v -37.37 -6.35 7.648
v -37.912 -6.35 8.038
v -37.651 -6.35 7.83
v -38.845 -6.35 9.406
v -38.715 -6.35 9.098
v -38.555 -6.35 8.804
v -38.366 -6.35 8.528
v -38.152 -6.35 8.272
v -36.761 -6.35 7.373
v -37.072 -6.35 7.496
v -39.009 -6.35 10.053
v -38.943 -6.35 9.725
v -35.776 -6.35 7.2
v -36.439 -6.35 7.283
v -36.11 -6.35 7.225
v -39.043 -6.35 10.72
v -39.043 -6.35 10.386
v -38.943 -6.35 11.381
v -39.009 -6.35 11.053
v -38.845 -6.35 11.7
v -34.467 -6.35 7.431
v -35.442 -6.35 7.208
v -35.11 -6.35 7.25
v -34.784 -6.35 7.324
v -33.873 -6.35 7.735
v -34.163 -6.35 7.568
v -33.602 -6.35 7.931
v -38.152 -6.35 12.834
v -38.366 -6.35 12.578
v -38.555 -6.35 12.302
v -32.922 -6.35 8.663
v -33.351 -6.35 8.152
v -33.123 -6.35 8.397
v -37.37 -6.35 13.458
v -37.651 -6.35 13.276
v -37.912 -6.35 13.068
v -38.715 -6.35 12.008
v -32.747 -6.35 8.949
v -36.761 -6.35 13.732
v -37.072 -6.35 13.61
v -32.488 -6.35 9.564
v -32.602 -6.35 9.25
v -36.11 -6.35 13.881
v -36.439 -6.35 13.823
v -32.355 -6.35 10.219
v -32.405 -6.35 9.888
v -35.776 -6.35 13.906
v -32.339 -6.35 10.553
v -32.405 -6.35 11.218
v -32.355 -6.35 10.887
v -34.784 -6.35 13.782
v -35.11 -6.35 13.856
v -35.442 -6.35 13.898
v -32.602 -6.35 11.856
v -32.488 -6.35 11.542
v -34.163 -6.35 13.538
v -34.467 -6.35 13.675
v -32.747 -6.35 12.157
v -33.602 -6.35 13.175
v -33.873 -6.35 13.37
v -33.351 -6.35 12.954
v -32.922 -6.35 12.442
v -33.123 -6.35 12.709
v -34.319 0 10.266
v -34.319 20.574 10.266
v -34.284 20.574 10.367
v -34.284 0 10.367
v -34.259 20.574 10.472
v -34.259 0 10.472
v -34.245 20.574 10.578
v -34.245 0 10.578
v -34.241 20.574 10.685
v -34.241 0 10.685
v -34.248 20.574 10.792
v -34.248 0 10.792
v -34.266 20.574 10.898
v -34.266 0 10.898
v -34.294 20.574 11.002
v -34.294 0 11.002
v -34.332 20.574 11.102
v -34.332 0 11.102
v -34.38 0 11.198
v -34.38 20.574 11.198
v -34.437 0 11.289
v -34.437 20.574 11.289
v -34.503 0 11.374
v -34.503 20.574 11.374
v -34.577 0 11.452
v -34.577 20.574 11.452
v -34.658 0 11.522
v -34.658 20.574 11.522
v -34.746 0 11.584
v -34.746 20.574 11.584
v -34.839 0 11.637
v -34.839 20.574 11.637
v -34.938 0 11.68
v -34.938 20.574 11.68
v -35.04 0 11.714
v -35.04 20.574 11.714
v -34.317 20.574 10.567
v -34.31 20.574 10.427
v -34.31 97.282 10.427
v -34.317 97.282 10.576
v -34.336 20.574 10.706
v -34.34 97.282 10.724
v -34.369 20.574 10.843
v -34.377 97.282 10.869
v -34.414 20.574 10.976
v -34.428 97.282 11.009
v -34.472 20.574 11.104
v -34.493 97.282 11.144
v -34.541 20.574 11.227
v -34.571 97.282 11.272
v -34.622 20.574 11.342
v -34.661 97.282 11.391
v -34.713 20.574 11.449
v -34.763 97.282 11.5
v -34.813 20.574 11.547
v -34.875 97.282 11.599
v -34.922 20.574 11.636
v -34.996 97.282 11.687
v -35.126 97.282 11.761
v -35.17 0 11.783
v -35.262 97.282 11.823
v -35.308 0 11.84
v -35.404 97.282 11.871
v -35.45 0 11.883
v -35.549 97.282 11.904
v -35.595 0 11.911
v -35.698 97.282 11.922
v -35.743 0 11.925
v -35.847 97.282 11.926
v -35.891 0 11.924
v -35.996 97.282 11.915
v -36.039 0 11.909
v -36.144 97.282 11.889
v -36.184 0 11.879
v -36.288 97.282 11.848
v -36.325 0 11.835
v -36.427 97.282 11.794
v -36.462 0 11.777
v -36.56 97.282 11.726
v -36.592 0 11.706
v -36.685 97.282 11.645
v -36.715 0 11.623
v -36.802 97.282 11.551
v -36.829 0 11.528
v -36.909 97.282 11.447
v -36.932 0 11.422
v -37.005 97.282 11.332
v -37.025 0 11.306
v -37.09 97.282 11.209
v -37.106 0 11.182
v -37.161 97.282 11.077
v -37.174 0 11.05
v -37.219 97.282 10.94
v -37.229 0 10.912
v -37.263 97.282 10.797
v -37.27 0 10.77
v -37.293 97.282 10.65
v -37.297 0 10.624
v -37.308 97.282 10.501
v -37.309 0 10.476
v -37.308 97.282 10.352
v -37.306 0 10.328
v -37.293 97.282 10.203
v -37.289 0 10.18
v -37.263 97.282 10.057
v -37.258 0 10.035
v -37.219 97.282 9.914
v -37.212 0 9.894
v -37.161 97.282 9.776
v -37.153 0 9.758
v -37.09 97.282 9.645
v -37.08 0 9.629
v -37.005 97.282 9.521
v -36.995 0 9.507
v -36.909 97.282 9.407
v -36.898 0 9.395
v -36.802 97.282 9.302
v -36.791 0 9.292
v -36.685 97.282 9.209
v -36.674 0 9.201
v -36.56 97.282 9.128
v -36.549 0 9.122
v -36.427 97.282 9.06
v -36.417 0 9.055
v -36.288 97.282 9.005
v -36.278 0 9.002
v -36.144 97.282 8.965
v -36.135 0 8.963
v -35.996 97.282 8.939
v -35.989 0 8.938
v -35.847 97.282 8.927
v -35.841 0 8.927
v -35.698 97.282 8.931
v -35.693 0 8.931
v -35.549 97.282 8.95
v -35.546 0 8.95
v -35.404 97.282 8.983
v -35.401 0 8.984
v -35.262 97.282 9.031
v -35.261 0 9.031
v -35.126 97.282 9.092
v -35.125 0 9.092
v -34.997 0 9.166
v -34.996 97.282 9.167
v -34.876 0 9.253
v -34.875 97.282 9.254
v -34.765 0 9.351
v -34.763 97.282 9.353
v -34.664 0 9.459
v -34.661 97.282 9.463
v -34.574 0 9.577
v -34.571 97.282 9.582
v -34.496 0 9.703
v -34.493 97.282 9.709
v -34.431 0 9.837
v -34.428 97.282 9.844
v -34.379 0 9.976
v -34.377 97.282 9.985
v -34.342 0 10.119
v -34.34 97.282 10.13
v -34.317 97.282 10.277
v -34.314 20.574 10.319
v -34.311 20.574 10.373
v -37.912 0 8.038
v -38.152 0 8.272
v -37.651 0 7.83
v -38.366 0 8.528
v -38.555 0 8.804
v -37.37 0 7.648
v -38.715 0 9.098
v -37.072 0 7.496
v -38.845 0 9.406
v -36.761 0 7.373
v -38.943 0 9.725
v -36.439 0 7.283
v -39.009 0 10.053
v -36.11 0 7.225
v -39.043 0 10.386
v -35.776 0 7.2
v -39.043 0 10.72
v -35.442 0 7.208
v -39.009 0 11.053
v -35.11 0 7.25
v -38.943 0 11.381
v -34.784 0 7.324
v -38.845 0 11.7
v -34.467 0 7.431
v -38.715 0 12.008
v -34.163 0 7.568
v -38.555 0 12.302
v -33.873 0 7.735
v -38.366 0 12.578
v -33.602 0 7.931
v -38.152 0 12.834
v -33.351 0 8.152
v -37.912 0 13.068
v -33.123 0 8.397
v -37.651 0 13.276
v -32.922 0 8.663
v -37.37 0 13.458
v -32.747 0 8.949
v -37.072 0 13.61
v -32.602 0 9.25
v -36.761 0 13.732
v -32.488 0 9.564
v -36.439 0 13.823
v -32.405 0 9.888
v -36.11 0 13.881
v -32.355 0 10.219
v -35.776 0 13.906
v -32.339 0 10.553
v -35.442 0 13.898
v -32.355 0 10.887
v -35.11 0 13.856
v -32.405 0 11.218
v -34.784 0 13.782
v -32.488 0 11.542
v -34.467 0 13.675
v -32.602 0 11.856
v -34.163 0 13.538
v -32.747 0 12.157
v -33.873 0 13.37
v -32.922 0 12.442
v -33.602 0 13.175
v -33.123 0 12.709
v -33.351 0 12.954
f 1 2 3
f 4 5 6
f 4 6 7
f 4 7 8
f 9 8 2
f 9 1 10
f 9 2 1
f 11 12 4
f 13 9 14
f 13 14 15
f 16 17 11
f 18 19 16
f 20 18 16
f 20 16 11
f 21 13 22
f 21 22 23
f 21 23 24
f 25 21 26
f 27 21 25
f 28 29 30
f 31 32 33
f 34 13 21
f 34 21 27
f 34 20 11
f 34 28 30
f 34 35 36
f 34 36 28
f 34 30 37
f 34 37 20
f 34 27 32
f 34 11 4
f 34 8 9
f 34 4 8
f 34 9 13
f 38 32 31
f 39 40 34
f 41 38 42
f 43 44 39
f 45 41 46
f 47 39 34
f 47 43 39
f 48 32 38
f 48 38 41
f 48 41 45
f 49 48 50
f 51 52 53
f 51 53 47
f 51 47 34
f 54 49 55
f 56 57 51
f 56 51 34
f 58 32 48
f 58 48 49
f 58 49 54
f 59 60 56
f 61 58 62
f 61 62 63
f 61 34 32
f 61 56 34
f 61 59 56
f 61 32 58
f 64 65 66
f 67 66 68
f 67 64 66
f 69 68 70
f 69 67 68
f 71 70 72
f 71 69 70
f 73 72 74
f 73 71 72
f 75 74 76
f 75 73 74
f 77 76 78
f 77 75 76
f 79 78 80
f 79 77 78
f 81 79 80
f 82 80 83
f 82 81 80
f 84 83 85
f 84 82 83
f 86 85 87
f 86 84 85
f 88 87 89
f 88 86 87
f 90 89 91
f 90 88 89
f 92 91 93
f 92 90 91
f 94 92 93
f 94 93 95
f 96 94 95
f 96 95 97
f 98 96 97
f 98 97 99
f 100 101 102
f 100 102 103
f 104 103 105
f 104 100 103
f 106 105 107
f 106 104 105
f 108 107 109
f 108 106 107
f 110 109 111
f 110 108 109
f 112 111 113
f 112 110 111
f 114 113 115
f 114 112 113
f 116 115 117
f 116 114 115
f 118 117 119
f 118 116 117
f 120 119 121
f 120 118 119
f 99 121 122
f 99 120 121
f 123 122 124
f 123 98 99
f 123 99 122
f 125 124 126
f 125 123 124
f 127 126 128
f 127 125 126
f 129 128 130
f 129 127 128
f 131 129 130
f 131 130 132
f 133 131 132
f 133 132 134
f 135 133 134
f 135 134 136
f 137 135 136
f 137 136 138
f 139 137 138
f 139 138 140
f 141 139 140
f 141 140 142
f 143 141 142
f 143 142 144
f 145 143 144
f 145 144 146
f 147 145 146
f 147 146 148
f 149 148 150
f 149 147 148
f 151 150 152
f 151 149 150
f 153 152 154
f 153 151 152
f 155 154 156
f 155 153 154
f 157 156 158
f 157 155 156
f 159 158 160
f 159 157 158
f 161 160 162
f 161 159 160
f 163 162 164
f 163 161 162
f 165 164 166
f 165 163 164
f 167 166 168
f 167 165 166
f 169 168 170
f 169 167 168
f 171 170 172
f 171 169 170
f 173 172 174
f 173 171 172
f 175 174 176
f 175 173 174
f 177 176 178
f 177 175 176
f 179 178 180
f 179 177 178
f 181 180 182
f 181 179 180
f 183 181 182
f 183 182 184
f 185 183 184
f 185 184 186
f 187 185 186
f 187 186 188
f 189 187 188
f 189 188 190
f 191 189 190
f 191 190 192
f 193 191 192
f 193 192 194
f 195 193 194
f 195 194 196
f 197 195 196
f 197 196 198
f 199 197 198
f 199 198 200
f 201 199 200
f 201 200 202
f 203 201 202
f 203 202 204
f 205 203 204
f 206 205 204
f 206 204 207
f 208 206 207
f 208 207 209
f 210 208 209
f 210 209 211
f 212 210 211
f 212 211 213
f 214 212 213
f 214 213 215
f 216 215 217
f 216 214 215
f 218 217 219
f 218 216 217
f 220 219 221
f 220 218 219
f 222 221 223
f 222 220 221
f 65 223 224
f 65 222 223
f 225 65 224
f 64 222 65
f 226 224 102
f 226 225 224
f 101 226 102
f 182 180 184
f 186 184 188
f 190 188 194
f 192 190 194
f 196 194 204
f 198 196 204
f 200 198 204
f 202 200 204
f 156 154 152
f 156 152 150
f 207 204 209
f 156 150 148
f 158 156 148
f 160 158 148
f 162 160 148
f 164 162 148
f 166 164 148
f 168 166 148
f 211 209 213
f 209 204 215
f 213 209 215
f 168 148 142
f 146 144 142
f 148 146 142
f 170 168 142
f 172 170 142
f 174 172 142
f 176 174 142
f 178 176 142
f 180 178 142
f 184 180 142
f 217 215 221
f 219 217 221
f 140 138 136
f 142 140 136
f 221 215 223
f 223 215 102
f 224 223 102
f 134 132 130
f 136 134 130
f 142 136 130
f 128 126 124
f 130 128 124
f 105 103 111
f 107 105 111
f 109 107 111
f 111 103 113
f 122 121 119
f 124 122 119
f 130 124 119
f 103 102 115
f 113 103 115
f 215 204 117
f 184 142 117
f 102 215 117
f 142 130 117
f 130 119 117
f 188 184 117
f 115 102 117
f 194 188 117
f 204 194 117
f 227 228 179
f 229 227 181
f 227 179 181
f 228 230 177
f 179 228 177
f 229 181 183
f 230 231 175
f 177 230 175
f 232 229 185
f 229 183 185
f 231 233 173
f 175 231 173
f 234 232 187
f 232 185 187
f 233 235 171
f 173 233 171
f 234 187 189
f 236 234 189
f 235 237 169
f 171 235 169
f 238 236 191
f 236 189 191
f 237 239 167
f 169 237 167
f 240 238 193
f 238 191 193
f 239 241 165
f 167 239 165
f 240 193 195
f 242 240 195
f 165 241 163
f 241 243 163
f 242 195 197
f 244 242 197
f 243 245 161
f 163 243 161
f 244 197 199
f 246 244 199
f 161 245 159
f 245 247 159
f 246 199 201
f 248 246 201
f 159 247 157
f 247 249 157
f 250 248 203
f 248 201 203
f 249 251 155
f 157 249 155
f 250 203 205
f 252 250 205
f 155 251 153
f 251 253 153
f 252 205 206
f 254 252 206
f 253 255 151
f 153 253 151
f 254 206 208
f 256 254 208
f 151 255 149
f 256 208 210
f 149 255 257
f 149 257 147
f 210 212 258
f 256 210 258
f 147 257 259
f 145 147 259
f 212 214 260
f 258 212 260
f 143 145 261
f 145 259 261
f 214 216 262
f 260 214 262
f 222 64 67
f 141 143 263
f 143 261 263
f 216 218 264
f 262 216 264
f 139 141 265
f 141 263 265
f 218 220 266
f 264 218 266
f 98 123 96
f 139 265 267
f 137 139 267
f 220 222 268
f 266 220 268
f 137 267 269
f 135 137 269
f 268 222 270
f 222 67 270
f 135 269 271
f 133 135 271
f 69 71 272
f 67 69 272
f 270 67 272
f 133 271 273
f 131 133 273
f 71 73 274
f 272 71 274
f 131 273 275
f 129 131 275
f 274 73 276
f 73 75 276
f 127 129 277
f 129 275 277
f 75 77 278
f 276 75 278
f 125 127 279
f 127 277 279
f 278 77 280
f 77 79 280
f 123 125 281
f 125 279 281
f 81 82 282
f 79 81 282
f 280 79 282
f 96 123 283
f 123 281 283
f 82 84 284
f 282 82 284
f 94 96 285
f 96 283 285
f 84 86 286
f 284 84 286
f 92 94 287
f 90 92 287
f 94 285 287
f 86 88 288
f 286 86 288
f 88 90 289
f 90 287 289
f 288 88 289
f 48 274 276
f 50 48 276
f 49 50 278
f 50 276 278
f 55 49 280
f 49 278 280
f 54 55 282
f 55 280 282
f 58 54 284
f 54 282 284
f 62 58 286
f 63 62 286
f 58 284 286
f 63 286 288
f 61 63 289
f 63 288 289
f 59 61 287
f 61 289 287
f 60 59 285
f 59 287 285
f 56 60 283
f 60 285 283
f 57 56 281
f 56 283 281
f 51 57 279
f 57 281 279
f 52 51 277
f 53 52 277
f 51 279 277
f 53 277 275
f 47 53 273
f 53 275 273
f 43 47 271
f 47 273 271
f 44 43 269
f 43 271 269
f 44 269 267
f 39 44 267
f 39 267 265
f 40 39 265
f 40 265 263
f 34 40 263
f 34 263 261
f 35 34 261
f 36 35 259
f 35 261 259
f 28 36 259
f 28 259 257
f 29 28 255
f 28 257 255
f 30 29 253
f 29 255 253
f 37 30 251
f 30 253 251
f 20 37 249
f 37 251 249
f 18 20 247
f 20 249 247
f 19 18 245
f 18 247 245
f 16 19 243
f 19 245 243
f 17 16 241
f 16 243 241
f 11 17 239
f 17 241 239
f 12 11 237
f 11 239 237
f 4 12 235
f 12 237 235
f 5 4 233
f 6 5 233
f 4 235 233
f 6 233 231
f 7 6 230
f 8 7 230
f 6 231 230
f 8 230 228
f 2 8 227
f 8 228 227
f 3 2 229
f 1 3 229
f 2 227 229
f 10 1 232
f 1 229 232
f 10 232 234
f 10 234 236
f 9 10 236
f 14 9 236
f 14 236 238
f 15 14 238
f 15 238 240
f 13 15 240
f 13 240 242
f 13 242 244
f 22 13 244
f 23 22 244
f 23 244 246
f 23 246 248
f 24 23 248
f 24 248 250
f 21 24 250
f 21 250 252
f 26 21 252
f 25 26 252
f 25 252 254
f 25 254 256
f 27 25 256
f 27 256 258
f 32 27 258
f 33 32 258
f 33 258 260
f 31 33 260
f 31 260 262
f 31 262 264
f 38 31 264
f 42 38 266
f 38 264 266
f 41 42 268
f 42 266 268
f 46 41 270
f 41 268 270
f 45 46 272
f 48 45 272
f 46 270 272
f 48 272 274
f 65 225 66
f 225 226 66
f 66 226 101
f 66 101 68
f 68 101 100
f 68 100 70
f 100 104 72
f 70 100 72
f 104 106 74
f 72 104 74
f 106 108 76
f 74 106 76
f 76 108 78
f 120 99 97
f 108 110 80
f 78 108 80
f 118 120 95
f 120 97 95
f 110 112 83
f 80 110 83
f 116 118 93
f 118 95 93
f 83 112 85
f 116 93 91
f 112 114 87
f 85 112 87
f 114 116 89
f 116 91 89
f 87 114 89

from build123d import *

# Parameters (mm, degrees)
F0_R     = 3.354118
F1_DEPTH = 6.35
F2_R     = 1.499831
F3_DEPTH = 97.282
F4_R     = 1.083943
F5_DEPTH = 20.574


with BuildPart() as f1:
    # F0 (on Front) → F1 (new body)
    with BuildSketch(Plane.XZ):
        with Locations((-35.692804, 10.552901)):
            Circle(F0_R)
    extrude(amount=F1_DEPTH)

    # F2 (on Front) → F3 (join)
    with BuildSketch(Plane.XZ):
        with Locations((-35.80986, 10.426732)):
            Circle(F2_R)
    extrude(amount=-F3_DEPTH)

    # F4 (on Front) → F5 (join)
    with BuildSketch(Plane.XZ):
        with Locations((-35.32517, 10.668001)):
            Circle(F4_R)
    extrude(amount=-F5_DEPTH)


solid = f1.part
